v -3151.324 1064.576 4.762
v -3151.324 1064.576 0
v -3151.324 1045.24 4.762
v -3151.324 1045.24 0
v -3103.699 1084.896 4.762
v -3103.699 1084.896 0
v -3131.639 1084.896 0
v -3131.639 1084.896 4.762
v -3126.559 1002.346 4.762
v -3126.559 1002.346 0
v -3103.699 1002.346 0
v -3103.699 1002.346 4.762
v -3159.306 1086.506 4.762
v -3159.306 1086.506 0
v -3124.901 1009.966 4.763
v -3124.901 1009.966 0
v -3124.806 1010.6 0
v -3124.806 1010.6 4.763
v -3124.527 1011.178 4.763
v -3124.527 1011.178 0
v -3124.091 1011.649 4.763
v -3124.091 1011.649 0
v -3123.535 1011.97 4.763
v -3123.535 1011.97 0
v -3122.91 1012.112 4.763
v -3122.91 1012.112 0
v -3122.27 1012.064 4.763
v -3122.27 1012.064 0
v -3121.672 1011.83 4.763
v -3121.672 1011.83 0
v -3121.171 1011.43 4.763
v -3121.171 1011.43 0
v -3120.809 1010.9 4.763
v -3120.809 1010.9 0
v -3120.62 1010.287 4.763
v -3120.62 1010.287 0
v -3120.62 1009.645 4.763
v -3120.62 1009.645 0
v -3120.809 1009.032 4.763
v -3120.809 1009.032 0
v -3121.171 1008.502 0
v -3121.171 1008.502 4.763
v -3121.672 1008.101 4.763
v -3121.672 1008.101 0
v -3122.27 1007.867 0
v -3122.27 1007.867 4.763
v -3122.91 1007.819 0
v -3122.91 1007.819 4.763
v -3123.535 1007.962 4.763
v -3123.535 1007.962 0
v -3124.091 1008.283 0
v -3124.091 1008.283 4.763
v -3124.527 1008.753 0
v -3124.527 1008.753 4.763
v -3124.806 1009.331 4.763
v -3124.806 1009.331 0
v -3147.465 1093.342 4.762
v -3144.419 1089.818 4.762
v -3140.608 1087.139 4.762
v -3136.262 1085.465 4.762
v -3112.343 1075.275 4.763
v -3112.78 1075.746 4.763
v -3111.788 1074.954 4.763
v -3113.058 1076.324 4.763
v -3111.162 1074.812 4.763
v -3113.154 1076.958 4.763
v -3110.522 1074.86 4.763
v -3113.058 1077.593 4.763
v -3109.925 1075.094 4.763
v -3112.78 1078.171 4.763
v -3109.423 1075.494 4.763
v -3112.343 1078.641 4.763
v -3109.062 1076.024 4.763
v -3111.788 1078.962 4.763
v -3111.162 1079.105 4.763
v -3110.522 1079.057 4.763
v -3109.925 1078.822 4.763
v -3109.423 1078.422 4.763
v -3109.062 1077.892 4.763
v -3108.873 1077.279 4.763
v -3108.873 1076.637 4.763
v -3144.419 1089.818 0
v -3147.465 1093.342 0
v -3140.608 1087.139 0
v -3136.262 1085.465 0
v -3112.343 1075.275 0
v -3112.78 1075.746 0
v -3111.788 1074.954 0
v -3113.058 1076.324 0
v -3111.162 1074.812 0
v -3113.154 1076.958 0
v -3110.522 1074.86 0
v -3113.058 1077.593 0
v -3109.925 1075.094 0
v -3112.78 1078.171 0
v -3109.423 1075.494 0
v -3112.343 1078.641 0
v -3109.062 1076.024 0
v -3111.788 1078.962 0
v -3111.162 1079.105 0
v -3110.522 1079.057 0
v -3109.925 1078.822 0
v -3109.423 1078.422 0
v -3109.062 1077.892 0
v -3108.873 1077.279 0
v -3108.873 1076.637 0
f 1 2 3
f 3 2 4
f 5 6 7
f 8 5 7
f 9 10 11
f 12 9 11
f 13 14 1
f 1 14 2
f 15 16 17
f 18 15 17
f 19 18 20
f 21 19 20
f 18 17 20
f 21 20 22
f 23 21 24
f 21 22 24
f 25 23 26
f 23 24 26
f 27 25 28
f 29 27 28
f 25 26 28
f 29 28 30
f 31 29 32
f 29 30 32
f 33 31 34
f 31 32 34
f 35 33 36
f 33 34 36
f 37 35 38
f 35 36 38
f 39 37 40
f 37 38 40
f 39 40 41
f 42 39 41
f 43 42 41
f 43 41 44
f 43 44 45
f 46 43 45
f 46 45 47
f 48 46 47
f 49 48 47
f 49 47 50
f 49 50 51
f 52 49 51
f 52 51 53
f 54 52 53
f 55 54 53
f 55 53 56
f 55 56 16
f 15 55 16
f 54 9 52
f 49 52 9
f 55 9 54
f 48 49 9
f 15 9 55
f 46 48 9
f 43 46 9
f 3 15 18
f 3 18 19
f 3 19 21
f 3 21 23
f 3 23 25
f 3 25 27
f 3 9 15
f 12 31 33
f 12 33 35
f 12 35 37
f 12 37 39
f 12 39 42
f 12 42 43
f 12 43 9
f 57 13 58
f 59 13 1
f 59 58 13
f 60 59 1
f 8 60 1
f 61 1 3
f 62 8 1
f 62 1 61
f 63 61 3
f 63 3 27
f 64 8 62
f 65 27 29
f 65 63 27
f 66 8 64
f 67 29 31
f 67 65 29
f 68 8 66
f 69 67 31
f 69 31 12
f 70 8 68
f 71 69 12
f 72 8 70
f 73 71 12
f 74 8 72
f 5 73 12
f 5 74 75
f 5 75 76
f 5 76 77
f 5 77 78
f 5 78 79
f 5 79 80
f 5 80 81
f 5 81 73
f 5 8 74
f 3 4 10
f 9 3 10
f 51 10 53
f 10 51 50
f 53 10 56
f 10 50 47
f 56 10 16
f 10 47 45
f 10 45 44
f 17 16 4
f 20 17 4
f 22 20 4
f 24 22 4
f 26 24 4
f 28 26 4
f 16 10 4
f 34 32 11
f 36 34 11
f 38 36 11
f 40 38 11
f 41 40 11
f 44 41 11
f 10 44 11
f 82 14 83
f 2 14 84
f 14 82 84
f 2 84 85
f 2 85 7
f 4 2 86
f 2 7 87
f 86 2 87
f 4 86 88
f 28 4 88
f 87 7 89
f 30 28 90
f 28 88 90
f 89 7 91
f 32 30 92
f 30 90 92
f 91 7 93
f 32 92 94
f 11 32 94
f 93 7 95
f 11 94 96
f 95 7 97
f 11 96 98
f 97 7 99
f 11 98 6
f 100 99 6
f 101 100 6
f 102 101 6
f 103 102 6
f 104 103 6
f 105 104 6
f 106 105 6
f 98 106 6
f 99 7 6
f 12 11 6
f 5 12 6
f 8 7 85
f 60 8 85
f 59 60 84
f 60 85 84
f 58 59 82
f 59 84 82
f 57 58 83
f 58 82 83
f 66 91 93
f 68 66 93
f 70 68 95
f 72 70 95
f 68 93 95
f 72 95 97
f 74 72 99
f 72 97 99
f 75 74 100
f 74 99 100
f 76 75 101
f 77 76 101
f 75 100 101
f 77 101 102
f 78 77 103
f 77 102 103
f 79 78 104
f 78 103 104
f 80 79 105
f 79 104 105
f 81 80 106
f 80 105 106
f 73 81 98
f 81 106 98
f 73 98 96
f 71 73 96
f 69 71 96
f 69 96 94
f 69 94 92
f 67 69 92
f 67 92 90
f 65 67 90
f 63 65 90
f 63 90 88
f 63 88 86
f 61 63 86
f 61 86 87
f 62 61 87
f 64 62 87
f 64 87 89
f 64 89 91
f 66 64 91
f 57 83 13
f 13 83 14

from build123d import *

# Parameters (mm, degrees)
BOSS_EXTRUDE1_DEPTH   = 4.7625
F_6_CLEARANCE_HOLE1_D = 4.3053


with BuildPart() as part:
    # Sketch1 → Boss-Extrude1 (new body)
    with BuildSketch(Plane.XY):
        with BuildLine():
            Line((-3103.698757178, 1002.345694712), (-3103.698757178, 1084.895694712))
            Line((-3103.698757178, 1084.895694712), (-3131.638757178, 1084.895694712))
            ThreePointArc((-3131.638757178, 1084.895694712), (-3140.608225903, 1087.139412233), (-3147.464838552, 1093.342032687))
            Line((-3147.464838552, 1093.342032687), (-3159.30564158, 1086.505741871))
            Line((-3159.30564158, 1086.505741871), (-3151.323757178, 1064.575694712))
            Line((-3151.323757178, 1064.575694712), (-3151.323757178, 1045.239932962))
            Line((-3151.323757178, 1045.239932962), (-3126.558757178, 1002.345694712))
            Line((-3126.558757178, 1002.345694712), (-3103.698757178, 1002.345694712))
        make_face()
    extrude(amount=BOSS_EXTRUDE1_DEPTH)

    # #6 Clearance Hole1 (through all)
    with Locations(Plane.XY.offset(4.7625)):
        with Locations((-3122.748757178, 1009.965694712), (-3111.001257178, 1076.958194712)):
            Hole(F_6_CLEARANCE_HOLE1_D / 2)


solid = part.part
